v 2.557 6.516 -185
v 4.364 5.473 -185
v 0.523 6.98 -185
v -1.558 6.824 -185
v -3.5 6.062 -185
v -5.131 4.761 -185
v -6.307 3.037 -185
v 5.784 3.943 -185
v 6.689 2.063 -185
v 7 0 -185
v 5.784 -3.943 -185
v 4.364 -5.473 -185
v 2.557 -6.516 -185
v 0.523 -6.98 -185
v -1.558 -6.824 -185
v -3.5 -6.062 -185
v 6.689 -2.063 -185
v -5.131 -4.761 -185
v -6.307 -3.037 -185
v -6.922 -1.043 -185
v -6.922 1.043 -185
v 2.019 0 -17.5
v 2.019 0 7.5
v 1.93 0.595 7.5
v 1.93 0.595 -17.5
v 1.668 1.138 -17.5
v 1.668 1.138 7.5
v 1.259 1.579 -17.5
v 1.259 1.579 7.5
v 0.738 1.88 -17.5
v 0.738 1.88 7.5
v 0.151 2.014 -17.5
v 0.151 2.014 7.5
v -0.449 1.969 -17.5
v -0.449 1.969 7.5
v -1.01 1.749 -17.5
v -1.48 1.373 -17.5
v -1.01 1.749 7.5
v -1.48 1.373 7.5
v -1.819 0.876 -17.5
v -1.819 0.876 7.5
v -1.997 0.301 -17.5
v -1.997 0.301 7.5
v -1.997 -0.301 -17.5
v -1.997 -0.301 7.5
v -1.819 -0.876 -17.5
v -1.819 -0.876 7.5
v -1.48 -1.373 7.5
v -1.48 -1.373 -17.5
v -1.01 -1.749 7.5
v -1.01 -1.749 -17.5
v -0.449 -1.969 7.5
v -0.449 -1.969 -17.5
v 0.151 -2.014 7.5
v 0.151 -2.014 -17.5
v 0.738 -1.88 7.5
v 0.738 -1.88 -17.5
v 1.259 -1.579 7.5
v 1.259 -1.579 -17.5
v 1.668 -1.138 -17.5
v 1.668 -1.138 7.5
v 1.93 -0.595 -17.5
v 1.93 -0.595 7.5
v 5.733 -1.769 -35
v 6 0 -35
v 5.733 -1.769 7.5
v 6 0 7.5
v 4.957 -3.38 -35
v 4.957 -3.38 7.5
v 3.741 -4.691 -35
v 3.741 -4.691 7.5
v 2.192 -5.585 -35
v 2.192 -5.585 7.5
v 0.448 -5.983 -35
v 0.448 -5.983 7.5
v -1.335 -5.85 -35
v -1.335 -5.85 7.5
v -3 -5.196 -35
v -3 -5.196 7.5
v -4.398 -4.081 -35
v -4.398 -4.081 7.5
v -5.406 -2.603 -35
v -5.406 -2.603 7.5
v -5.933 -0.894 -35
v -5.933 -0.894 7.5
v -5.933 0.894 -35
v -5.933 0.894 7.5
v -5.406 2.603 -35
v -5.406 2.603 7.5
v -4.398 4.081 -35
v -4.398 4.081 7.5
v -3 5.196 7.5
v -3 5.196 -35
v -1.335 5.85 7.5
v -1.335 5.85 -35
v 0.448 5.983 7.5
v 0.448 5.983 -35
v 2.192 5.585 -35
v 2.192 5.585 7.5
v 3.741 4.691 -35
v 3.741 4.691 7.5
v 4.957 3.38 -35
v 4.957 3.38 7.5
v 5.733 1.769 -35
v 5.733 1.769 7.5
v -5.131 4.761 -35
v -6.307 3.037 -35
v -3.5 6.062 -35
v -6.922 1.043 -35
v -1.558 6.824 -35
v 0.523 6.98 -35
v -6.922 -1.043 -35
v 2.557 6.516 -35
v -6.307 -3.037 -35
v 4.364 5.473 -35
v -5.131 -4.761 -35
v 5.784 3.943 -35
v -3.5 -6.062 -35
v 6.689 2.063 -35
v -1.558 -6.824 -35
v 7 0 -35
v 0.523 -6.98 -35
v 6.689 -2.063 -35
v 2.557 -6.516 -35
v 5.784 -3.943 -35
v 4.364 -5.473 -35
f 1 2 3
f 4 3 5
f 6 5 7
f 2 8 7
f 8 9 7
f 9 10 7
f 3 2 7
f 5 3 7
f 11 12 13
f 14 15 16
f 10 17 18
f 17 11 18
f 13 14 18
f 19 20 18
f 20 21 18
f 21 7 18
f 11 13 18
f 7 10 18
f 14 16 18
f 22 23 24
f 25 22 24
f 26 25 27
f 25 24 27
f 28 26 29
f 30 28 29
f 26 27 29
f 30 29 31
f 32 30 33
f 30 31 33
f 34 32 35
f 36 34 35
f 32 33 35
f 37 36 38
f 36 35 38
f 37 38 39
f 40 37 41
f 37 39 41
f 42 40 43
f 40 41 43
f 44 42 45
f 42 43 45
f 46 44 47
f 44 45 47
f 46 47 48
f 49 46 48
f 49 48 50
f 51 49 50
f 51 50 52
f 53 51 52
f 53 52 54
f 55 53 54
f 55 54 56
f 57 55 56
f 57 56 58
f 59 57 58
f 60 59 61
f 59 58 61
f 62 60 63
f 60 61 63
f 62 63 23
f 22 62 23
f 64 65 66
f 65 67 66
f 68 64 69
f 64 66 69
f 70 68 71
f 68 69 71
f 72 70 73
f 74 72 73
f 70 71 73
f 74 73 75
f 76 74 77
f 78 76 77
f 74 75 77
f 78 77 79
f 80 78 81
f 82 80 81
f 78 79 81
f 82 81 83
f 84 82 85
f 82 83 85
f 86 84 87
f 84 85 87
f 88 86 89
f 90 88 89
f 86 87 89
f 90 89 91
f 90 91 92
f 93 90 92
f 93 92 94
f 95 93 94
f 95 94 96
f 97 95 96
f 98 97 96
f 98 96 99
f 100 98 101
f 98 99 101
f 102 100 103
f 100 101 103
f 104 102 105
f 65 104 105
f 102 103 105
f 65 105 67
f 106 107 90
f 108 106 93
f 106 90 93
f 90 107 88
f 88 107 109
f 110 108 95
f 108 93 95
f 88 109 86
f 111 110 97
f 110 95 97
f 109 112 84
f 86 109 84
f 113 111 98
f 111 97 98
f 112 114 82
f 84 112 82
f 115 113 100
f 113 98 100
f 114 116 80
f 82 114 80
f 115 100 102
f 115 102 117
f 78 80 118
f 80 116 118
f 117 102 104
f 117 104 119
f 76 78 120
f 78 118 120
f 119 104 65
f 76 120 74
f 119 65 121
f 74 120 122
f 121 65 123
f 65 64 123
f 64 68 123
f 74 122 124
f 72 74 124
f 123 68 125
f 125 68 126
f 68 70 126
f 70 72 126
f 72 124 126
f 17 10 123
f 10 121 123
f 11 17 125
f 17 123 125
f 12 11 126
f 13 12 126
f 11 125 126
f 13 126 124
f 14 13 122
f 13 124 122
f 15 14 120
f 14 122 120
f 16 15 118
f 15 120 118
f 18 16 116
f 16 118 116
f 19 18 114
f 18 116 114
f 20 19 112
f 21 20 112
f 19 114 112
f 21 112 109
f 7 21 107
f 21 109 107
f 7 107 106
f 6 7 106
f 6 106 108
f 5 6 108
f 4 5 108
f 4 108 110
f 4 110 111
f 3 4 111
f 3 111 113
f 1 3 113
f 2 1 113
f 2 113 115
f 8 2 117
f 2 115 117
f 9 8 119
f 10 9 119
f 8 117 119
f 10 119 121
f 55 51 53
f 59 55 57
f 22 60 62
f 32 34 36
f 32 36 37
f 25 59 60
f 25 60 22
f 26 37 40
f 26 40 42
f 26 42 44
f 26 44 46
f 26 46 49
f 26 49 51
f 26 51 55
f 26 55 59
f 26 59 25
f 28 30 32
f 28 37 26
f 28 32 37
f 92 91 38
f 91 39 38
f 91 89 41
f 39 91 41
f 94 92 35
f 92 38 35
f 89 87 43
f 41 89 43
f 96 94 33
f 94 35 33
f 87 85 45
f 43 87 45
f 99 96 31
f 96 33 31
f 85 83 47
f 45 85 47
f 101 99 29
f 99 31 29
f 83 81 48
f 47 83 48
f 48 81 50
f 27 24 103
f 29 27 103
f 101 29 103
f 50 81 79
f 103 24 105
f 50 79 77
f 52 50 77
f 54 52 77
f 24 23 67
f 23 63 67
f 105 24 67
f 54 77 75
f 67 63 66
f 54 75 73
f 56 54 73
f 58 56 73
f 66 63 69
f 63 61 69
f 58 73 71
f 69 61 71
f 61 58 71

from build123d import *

# Parameters (mm, degrees)
SKETCH2_R          = 2.0193
CUT_EXTRUDE1_DEPTH = 25


with BuildPart() as part:
    # Sketch1 → Revolve1 (revolve)
    with BuildSketch(Plane(origin=(0, 0, 0), x_dir=(0, 0, -1), z_dir=(1, 0, 0)), mode=Mode.PRIVATE) as revolve1_sk:
        Polygon((185, 0), (185, 7), (35, 7), (35, 6), (-7.5, 6), (-7.5, 0), align=None)
    revolve(revolve1_sk.sketch.rotate(Axis((0, 0, 0), (0, 0, -1)), 90), axis=Axis((0, 0, 0), (0, 0, -1)))

    # Sketch2 → Cut-Extrude1 (cut)
    with BuildSketch(Plane.XY.offset(7.5)):
        Circle(SKETCH2_R)
    extrude(amount=-CUT_EXTRUDE1_DEPTH, mode=Mode.SUBTRACT)


solid = part.part
